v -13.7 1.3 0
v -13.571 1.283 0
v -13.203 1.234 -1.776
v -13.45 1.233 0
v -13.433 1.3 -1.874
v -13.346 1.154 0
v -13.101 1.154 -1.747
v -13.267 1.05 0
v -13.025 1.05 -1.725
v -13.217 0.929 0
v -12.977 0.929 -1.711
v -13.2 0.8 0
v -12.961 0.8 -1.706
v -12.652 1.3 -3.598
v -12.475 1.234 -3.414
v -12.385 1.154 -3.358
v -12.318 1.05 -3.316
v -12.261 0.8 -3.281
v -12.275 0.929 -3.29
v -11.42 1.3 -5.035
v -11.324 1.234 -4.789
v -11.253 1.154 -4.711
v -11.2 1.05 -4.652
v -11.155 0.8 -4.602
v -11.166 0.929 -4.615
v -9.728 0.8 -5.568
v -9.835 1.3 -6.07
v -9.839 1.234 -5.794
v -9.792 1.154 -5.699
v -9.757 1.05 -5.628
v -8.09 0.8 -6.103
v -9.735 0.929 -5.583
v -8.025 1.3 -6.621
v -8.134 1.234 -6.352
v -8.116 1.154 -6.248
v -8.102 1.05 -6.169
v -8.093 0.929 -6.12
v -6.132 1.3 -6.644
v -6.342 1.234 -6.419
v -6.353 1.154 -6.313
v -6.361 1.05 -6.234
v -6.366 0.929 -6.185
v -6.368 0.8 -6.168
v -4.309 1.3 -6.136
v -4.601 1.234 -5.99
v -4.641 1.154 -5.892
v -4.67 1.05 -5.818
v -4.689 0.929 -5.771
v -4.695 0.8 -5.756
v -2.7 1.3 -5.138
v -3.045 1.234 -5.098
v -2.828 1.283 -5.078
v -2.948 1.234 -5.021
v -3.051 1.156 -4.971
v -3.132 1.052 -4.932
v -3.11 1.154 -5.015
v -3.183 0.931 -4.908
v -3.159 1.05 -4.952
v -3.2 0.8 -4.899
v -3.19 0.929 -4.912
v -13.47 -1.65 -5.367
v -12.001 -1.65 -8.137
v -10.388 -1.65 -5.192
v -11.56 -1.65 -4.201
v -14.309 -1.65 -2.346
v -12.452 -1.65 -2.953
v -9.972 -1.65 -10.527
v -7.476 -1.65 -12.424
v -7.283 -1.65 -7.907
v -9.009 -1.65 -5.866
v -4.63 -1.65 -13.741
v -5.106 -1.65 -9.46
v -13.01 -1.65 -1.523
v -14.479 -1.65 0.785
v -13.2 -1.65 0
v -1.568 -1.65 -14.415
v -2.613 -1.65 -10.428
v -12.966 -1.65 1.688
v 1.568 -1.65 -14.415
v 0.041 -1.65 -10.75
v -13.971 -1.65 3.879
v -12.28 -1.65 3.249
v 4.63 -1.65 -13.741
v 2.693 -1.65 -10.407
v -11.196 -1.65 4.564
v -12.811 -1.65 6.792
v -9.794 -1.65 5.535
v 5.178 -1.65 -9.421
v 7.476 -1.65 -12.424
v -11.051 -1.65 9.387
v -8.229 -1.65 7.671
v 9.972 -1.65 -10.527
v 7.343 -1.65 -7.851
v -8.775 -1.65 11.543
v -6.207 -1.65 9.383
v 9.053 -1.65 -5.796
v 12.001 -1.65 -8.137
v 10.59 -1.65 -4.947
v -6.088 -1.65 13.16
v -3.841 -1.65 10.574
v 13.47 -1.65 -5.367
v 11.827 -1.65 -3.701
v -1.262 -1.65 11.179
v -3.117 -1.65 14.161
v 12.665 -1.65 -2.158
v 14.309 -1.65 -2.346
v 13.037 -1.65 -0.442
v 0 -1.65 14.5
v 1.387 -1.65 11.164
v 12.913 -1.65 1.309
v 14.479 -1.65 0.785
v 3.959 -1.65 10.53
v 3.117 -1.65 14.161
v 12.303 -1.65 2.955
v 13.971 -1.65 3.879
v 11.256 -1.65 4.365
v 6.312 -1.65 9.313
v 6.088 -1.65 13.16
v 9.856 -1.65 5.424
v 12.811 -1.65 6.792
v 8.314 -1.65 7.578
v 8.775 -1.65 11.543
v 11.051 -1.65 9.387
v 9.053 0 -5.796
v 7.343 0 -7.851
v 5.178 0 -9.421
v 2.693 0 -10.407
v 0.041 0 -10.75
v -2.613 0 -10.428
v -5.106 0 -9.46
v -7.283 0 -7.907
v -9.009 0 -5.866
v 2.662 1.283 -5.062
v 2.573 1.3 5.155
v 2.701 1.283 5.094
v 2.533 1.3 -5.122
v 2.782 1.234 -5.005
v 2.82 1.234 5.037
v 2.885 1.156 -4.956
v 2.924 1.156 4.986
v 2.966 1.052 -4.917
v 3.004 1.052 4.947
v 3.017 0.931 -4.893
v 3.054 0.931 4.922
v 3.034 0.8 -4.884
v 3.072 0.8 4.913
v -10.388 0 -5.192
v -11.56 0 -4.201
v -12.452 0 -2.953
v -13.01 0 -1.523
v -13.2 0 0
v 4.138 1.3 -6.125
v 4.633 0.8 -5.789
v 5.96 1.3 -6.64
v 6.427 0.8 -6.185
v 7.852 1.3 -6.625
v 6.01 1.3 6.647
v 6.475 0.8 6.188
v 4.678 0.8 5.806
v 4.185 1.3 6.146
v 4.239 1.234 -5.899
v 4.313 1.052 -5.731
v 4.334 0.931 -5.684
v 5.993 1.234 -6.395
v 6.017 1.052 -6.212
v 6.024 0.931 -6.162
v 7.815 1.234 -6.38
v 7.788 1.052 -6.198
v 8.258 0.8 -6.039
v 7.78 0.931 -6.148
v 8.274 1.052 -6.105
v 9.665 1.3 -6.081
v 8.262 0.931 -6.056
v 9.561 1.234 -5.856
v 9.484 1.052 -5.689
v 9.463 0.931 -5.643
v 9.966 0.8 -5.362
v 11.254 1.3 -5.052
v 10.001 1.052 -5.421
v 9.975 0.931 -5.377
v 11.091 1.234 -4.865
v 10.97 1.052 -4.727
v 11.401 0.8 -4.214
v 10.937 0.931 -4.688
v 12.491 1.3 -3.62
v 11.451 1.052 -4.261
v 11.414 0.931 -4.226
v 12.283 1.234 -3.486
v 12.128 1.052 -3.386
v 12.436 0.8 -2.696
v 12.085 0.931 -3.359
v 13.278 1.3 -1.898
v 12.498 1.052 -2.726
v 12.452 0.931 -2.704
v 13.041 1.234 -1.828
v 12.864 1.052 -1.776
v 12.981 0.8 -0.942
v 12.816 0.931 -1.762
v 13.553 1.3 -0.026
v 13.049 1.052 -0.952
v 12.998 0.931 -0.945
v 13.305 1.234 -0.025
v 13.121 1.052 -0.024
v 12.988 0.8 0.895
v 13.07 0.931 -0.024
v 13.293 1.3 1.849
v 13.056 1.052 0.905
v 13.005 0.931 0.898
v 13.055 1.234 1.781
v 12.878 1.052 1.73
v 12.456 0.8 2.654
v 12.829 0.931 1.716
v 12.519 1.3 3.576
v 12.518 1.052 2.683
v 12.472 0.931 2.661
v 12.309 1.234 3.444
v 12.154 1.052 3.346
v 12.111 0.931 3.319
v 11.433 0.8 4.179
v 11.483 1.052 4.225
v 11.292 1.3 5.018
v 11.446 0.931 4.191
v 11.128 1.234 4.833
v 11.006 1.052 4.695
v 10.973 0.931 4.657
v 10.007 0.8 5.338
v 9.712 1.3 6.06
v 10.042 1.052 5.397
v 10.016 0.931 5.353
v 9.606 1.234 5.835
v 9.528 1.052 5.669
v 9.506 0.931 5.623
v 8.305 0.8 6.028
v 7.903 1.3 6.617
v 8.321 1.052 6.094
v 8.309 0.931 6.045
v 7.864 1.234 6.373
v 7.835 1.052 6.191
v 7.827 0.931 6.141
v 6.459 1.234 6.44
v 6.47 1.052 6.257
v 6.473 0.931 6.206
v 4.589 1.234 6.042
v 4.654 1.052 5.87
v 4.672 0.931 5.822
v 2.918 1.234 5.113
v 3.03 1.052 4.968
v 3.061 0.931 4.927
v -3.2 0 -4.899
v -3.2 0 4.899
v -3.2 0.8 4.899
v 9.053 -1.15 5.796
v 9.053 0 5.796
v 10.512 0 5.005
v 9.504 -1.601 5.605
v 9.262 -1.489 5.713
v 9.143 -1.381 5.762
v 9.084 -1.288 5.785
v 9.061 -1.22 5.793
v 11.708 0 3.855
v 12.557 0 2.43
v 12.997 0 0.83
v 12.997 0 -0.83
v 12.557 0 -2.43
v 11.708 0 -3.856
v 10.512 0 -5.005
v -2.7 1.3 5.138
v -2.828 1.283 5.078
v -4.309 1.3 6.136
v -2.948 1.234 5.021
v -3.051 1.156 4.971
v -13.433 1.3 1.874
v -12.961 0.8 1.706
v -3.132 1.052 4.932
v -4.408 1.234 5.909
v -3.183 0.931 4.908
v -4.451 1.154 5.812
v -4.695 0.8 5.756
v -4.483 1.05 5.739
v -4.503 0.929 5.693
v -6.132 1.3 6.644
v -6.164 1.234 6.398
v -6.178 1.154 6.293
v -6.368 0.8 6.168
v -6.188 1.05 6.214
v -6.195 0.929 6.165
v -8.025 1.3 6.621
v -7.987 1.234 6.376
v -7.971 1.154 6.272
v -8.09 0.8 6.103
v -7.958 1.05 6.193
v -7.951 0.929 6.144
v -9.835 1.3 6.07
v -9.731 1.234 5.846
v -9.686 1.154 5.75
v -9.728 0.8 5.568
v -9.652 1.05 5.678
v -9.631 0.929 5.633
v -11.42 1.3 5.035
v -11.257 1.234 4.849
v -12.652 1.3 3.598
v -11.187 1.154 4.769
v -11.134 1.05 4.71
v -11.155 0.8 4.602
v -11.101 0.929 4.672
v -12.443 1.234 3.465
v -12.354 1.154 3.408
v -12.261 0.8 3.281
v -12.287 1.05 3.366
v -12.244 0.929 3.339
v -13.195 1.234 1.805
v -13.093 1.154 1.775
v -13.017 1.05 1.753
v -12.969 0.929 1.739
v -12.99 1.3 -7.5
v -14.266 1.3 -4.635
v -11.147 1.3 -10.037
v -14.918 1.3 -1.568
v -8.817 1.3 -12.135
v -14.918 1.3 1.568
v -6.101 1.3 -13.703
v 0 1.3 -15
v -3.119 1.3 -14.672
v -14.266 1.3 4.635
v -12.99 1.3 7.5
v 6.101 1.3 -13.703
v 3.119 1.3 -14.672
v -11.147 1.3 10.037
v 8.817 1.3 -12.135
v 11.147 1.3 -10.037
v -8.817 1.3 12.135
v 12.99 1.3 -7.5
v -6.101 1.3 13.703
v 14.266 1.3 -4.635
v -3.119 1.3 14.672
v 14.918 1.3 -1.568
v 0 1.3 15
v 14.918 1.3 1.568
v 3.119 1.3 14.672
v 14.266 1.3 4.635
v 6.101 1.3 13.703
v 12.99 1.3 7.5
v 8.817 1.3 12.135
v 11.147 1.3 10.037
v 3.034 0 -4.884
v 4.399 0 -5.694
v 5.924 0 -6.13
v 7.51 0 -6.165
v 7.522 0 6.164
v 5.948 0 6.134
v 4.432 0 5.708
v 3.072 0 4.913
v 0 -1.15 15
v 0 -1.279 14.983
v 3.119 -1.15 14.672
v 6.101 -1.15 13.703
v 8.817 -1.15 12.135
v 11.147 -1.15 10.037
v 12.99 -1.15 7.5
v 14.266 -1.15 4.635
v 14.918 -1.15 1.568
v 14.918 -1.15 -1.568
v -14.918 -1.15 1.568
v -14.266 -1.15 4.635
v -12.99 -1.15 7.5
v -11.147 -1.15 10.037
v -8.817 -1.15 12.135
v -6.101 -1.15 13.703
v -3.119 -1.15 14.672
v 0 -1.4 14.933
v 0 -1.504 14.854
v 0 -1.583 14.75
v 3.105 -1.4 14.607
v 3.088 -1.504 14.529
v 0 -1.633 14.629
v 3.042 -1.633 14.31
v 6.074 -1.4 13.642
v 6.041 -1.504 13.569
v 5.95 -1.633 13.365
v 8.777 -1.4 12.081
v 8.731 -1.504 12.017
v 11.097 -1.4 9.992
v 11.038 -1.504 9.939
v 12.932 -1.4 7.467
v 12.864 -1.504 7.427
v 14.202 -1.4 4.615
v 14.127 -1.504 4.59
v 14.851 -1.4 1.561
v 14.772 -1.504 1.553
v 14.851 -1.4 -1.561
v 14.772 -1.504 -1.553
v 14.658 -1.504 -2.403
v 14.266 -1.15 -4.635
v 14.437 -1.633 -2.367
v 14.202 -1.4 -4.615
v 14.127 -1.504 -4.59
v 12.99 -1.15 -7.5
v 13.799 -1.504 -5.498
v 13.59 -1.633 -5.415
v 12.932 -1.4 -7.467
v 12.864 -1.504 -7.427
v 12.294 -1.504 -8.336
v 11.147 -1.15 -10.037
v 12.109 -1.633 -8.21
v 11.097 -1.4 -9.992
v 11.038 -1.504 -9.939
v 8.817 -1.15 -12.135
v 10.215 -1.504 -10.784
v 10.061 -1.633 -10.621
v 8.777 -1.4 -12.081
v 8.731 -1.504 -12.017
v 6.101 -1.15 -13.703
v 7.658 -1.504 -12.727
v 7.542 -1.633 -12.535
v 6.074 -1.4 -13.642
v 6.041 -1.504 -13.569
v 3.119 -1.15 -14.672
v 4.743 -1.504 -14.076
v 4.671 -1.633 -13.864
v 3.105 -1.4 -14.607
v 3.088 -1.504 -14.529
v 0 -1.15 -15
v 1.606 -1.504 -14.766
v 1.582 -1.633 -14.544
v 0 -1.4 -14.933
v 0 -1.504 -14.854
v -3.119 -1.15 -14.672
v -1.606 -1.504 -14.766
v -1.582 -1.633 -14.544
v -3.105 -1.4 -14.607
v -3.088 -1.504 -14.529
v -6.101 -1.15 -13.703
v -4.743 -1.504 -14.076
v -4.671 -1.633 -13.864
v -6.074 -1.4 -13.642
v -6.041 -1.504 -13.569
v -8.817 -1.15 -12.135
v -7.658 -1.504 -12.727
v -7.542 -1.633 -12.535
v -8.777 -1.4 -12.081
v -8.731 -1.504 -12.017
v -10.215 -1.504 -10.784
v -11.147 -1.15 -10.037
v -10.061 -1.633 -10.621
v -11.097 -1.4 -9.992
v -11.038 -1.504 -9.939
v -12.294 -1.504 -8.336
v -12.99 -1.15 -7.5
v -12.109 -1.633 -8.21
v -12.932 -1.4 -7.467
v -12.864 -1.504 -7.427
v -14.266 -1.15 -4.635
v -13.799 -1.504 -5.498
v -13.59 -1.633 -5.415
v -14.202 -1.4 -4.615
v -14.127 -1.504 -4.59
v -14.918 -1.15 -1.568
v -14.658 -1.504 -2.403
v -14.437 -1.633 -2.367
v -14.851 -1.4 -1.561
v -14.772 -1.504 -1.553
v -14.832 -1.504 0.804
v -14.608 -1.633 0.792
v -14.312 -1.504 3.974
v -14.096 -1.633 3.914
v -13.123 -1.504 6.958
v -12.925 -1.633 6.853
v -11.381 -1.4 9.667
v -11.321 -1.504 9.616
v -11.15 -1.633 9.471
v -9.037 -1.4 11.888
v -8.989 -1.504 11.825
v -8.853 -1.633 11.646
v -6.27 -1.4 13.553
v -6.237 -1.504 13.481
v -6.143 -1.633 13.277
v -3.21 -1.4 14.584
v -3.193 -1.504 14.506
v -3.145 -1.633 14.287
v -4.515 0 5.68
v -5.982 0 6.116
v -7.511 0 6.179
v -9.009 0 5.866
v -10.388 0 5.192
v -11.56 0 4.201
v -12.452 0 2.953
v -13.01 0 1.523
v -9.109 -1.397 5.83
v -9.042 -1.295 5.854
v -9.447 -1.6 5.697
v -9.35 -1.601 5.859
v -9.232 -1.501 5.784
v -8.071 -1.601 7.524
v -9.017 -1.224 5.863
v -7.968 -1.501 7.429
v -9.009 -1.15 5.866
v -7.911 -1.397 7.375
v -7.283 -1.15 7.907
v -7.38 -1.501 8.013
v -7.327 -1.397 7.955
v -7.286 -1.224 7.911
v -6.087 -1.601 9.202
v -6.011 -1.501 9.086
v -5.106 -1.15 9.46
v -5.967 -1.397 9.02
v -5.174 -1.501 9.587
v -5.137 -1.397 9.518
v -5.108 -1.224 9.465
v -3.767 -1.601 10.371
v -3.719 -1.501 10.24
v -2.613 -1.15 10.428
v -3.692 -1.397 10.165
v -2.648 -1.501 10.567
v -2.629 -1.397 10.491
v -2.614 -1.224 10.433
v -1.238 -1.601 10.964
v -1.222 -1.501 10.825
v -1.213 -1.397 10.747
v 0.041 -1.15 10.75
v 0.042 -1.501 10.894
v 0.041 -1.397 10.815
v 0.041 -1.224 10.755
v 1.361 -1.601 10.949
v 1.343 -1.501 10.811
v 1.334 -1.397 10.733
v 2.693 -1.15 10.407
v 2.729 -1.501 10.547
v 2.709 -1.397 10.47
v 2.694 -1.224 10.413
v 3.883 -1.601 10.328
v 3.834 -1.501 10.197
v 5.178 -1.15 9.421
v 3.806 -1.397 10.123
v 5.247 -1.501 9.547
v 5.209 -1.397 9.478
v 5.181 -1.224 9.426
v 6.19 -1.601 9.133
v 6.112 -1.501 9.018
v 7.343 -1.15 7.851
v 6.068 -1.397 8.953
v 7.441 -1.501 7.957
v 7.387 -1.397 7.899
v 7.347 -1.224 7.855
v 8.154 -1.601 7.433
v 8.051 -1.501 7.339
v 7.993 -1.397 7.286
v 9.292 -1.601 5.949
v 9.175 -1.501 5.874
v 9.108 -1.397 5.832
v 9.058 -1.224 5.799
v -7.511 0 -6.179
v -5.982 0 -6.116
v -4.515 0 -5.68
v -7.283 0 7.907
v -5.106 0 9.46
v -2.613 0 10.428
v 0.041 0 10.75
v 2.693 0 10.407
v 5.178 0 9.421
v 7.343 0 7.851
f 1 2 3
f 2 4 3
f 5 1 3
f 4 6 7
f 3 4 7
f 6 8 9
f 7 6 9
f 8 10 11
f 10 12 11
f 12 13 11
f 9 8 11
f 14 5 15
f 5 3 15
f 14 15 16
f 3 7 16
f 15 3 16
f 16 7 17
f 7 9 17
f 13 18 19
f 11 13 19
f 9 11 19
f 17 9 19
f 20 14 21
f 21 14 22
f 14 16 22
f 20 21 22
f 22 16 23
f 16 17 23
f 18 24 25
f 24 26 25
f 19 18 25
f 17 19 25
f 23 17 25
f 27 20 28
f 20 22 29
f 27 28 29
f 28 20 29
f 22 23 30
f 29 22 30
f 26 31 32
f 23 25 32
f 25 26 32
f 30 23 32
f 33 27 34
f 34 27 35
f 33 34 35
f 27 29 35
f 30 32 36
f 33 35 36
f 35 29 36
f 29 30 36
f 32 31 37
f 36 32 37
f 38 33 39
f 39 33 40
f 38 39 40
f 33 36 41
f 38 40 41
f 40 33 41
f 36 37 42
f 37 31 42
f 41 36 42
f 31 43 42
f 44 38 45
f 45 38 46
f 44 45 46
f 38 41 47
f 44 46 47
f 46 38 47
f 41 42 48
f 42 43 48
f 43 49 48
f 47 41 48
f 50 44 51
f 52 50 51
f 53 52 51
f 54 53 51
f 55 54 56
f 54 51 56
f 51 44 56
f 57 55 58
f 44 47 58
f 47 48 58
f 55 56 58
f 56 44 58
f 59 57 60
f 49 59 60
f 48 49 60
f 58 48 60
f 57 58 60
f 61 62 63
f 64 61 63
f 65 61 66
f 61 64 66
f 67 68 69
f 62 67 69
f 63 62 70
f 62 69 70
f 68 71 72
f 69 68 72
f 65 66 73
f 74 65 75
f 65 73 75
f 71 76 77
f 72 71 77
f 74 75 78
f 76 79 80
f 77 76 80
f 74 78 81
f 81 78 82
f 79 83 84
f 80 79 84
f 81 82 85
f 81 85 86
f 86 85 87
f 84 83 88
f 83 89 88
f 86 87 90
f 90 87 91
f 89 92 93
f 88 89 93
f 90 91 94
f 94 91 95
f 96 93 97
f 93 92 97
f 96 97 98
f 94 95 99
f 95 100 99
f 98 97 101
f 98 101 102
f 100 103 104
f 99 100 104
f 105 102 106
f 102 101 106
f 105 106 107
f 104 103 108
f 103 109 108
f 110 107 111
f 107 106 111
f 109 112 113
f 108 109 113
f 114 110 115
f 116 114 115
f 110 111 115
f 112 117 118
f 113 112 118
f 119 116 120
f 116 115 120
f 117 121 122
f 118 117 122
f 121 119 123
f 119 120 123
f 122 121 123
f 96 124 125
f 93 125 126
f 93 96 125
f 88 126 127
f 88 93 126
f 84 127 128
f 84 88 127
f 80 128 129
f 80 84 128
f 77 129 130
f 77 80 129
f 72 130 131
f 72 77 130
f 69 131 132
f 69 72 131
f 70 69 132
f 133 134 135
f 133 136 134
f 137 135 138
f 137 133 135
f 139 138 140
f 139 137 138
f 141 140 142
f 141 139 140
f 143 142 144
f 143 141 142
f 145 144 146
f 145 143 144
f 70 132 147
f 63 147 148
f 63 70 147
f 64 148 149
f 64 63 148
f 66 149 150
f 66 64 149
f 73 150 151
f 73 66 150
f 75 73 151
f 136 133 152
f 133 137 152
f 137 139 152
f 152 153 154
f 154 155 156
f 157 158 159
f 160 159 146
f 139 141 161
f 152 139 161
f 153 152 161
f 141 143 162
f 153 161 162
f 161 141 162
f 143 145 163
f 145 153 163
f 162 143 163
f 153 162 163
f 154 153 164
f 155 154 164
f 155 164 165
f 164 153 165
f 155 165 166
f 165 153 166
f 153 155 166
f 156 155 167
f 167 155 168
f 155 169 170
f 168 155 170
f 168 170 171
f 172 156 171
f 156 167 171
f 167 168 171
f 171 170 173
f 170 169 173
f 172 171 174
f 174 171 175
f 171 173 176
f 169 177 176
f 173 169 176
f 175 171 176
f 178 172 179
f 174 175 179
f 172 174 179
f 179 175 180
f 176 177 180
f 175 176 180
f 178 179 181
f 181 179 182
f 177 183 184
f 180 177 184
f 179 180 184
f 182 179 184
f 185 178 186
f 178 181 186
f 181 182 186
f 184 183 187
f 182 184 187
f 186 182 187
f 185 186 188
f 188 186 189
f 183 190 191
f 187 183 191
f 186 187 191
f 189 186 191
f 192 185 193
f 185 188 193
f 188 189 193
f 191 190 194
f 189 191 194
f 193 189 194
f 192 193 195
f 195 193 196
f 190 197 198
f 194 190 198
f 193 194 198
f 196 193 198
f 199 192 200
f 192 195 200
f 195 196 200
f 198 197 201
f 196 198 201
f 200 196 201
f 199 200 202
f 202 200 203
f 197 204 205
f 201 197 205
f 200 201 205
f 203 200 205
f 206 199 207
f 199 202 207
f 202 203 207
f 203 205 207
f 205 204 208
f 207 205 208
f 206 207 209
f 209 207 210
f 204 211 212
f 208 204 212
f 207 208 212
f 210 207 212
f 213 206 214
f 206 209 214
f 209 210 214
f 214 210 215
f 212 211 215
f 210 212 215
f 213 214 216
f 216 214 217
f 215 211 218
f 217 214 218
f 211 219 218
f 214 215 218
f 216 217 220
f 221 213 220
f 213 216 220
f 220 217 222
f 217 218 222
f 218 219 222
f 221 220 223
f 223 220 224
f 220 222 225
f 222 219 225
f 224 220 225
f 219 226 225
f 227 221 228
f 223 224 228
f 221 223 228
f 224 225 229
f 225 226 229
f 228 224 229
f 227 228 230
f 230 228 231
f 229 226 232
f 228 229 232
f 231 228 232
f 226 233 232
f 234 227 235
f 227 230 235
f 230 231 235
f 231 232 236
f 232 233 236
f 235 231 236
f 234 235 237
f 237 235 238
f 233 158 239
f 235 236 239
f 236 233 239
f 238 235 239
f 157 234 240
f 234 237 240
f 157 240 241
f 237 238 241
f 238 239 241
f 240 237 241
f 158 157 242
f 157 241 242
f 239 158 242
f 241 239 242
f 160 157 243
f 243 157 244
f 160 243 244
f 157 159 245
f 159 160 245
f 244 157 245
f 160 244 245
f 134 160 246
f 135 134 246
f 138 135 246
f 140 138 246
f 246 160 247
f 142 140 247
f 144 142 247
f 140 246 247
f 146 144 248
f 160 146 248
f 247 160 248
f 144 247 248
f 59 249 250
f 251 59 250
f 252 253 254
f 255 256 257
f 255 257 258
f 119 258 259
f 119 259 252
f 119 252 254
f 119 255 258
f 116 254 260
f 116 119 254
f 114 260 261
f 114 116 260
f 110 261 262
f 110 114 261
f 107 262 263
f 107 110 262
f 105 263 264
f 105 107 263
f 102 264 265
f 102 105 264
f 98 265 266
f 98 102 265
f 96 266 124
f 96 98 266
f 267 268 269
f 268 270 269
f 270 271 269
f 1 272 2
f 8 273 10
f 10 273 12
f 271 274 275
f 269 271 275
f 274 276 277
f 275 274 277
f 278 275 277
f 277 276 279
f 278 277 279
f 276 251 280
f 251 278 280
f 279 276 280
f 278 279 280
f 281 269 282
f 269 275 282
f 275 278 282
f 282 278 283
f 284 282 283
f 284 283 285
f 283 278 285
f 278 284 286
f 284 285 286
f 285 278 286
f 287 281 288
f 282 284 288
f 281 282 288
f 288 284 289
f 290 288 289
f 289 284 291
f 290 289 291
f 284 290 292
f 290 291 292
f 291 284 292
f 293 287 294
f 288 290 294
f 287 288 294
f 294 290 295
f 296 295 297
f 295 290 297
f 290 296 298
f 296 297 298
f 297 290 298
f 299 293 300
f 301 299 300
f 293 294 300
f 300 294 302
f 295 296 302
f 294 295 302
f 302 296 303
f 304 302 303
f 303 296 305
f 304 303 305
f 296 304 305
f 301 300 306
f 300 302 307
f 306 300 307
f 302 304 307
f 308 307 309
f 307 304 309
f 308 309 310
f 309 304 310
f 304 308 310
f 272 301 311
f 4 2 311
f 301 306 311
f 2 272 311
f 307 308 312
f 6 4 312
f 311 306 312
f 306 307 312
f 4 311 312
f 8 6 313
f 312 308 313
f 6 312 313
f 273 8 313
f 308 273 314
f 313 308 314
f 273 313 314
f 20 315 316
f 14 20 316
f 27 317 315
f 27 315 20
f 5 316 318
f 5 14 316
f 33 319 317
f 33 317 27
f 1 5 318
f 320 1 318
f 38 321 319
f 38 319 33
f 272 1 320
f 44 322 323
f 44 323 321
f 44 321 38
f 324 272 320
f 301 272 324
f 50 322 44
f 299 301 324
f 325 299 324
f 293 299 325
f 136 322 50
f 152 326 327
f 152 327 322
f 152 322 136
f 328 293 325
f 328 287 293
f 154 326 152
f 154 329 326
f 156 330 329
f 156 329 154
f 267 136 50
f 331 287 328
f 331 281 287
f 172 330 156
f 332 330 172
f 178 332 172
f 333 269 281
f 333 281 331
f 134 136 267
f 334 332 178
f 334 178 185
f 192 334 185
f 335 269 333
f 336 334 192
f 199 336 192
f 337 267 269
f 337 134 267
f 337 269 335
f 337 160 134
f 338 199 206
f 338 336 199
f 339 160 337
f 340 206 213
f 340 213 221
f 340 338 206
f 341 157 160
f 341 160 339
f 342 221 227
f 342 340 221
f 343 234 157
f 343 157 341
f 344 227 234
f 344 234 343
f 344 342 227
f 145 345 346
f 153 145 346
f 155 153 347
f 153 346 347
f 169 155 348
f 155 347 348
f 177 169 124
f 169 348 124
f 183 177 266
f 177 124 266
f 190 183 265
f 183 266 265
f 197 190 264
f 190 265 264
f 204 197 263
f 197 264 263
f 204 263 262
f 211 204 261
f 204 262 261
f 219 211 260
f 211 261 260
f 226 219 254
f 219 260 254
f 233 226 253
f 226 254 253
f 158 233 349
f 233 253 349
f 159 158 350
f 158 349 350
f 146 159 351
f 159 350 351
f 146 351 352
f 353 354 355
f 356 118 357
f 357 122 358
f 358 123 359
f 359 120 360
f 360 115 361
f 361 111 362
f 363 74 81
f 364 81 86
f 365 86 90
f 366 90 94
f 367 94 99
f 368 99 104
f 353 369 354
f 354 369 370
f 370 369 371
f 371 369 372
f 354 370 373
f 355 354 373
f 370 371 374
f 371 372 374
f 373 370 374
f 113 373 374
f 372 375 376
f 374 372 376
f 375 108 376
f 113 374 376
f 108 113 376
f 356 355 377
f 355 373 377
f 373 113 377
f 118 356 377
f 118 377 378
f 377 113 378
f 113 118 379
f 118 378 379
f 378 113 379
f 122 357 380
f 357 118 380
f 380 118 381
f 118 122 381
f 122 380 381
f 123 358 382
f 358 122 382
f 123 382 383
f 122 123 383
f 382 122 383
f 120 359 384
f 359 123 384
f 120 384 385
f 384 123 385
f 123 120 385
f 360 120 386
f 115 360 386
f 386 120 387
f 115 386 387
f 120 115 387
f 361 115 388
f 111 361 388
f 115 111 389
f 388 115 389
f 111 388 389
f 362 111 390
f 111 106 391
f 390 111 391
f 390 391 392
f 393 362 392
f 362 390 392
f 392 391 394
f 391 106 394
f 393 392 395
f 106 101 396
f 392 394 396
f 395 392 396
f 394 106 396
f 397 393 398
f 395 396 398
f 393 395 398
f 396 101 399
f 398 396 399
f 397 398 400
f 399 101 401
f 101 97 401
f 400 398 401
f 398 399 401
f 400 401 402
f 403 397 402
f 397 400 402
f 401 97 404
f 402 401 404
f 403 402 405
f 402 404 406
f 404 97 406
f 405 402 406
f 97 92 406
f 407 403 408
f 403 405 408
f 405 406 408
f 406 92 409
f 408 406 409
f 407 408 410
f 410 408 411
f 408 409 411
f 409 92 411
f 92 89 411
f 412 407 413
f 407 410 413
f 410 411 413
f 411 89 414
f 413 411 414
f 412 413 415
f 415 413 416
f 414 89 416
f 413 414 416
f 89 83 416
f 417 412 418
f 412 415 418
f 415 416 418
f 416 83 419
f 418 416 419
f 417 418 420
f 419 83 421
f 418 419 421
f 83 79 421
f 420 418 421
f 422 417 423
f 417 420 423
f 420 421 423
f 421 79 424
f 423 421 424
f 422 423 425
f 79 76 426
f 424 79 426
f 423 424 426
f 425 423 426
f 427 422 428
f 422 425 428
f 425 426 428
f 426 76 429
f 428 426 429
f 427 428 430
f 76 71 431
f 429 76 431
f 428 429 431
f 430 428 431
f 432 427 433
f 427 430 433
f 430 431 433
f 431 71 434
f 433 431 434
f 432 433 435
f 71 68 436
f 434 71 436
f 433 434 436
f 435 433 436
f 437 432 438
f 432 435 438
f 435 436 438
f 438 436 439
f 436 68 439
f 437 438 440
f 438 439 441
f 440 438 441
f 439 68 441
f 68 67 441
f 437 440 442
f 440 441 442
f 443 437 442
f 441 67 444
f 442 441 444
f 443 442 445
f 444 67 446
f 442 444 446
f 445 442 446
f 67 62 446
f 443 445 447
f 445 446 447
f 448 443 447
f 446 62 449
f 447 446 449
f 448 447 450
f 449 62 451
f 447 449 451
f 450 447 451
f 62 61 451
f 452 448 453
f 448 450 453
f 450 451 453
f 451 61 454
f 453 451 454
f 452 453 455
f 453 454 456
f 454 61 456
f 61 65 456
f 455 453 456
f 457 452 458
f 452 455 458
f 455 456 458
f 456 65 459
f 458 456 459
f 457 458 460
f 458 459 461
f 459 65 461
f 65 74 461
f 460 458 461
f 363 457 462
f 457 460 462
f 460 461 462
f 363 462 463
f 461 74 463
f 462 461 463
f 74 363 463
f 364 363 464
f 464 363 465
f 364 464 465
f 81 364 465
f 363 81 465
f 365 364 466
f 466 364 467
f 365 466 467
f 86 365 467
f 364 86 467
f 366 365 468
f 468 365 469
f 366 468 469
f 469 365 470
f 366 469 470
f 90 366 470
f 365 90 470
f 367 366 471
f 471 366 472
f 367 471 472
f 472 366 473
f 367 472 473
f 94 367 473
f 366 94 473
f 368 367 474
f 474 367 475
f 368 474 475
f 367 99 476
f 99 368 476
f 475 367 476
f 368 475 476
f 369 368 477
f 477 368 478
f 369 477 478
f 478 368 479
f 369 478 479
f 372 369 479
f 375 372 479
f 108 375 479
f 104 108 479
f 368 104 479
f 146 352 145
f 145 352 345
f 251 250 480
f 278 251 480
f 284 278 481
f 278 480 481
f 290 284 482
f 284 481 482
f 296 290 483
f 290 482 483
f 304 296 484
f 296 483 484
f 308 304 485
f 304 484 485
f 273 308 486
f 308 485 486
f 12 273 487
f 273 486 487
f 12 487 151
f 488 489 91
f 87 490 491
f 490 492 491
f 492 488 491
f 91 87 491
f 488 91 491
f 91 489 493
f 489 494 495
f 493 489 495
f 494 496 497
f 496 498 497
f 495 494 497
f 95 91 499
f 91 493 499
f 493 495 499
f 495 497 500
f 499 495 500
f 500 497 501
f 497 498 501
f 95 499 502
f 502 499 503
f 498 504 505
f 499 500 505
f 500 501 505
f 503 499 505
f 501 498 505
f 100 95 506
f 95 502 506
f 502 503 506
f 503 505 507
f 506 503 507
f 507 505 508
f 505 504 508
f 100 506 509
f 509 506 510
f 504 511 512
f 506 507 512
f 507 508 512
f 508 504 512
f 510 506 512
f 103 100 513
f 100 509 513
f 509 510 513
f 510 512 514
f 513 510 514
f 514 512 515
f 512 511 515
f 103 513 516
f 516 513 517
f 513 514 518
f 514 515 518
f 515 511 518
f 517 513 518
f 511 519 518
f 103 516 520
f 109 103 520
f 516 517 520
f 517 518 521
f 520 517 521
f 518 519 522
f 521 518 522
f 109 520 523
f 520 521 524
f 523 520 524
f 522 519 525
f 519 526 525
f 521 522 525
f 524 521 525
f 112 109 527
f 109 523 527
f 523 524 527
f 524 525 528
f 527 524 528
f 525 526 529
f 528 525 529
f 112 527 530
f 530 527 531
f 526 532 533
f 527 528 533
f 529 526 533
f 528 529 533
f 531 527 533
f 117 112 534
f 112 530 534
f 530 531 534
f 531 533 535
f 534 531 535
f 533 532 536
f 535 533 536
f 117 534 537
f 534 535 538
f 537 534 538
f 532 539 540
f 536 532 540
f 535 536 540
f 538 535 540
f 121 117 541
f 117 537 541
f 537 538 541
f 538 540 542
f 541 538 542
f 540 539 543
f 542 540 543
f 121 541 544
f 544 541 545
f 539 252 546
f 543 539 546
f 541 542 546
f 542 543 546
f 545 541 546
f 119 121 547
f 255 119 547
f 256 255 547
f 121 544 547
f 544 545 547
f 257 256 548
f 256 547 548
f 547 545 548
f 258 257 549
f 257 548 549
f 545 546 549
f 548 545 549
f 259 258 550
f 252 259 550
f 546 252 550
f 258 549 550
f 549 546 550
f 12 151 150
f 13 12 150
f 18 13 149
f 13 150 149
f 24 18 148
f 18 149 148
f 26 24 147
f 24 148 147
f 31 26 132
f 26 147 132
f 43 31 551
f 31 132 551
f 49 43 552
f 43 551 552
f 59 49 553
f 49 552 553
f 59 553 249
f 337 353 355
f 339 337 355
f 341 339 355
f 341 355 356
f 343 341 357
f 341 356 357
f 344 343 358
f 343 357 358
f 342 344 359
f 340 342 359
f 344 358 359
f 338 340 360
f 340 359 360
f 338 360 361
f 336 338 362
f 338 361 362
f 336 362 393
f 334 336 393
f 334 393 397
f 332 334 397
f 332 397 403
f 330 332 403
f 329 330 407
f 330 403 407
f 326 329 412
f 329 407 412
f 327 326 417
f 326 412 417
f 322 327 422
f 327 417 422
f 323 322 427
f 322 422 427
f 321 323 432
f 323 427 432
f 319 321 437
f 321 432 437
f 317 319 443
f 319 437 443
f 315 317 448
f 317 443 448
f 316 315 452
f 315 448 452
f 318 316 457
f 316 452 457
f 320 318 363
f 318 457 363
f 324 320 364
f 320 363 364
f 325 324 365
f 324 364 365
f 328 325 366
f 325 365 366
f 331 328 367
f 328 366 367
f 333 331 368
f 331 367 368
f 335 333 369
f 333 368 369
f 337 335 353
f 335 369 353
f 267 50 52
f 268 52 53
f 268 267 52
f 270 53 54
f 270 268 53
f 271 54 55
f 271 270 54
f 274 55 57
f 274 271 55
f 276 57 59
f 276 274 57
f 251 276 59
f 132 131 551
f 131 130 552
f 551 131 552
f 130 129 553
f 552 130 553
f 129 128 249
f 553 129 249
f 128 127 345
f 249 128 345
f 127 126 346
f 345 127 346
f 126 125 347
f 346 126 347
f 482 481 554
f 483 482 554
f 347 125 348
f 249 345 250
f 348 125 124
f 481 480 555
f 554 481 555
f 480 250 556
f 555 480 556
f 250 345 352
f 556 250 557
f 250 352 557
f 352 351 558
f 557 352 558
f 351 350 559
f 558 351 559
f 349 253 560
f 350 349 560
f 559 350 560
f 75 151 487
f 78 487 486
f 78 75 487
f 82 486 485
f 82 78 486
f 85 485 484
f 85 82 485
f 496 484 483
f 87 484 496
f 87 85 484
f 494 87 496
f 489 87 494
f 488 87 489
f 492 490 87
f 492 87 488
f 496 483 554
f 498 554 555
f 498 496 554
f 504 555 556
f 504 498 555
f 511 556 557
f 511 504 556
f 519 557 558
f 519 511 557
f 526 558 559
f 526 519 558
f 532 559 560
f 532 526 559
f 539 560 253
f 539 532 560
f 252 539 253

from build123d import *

# Parameters (mm, degrees)
SKETCH1_R           = 15
BOSS_EXTRUDE1_DEPTH = 1.3
BOSS_EXTRUDE2_START = -1.65
SKETCH1_3_R         = 15
SKETCH1_3_R_2       = 10.75
BOSS_EXTRUDE2_DEPTH = 1.65
CUT_EXTRUDE1_START  = -10
SKETCH1_5_R         = 10.75
SKETCH1_5_R_2       = 6.2
CUT_EXTRUDE1_DEPTH  = 10
FILLET5_R           = 0.5
FILLET6_R           = 0.5


with BuildPart() as part:
    # Sketch1 → Boss-Extrude1 (new body)
    with BuildSketch(Plane(origin=(0, 0, 0), x_dir=(1, 0, 0), z_dir=(0, 1, 0))):
        with Locations(Location((0, 0, 0), (0, 0, 270))):
            Circle(SKETCH1_R)
        with BuildLine():
            ThreePointArc((-13.2, 0), (-9.727636339, 5.567764363), (-3.2, 4.898979486))
            Line((-3.2, 4.898979486), (-3.2, -4.898979486))
            ThreePointArc((-3.2, -4.898979486), (-9.727636339, -5.567764363), (-13.2, 0))
        make_face(mode=Mode.SUBTRACT)
        with BuildLine():
            Line((3.071845277, -4.91349301), (3.034307887, 4.884394056))
            ThreePointArc((3.034307887, 4.884394056), (13.053003194, 0.023761962), (3.071845277, -4.91349301))
        make_face(mode=Mode.SUBTRACT)
    extrude(amount=BOSS_EXTRUDE1_DEPTH)

    # Sketch1<3> → Boss-Extrude2 (add)
    with BuildSketch(Plane(origin=(0, 0, 0), x_dir=(1, 0, 0), z_dir=(0, 1, 0)).offset(BOSS_EXTRUDE2_START)):
        with Locations(Location((0, 0, 0), (0, 0, 270))):
            Circle(SKETCH1_3_R)
        with Locations(Location((0, 0, 0), (0, 0, 270))):
            Circle(SKETCH1_3_R_2, mode=Mode.SUBTRACT)
    extrude(amount=BOSS_EXTRUDE2_DEPTH)

    # Sketch1<5> → Cut-Extrude1 (cut)
    with BuildSketch(Plane(origin=(0, 0, 0), x_dir=(1, 0, 0), z_dir=(0, 1, 0)).offset(CUT_EXTRUDE1_START)):
        with BuildLine():
            ThreePointArc((-9.00875, -5.865571024), (-10.305497623, -3.059284026), (-10.75, 0))
            Line((-10.75, 0), (-13.2, 0))
            ThreePointArc((-13.2, 0), (-12.044514347, -3.60456308), (-9.00875, -5.865571024))
        make_face()
        with BuildLine():
            Line((-13.2, 0), (-10.75, 0))
            ThreePointArc((-10.75, 0), (-10.305497623, 3.059284026), (-9.00875, 5.865571024))
            ThreePointArc((-9.00875, 5.865571024), (-12.044514347, 3.60456308), (-13.2, 0))
        make_face()
        Circle(SKETCH1_5_R)
        with Locations((6.853048695, 8.87e-06)):
            Circle(SKETCH1_5_R_2)
    extrude(amount=CUT_EXTRUDE1_DEPTH, mode=Mode.SUBTRACT)

    # Fillet5
    fillet5_edges = [part.edges().sort_by_distance(p)[0] for p in [
        (-3.2, 1.3, 0),
        (13.053003194, 1.3, -0.023761962),
        (3.053076582, 1.3, 0.014549477),
        (-13.2, 1.3, 0),
    ]]
    fillet(fillet5_edges, radius=FILLET5_R)

    # Fillet6
    fillet6_edges = [part.edges().sort_by_distance(p)[0] for p in [
        (0, -1.65, -15),
        (0.041164562, -1.65, 10.749921185),
    ]]
    fillet(fillet6_edges, radius=FILLET6_R)


solid = part.part
